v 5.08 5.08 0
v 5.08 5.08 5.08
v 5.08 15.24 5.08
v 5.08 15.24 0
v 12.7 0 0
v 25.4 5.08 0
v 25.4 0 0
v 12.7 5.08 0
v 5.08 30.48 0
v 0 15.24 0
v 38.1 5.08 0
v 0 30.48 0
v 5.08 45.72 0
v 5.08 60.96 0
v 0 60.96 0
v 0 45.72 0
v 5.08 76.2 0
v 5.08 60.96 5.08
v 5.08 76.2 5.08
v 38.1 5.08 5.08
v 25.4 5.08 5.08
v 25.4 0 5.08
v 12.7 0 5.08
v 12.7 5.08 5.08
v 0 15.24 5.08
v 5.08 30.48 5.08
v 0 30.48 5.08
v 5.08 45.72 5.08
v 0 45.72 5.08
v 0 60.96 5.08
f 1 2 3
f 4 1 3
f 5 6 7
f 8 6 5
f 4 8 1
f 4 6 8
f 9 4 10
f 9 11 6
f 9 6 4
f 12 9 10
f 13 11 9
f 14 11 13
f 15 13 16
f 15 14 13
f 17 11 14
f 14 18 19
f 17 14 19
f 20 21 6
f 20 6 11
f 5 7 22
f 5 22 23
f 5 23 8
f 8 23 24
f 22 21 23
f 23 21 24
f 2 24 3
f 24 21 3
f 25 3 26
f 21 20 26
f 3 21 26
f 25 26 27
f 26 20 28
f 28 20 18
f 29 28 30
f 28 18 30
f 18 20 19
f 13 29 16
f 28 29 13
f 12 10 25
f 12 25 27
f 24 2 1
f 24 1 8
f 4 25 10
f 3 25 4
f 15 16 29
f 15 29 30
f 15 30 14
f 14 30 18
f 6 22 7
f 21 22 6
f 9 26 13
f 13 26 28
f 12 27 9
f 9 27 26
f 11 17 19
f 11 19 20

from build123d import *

# Parameters (mm, degrees)
BOSS_EXTRUDE1_DEPTH = 5.08
SKETCH2_W           = 5.08
SKETCH2_H           = 15.24
SKETCH2_H_2         = 10.16
SKETCH2_H_3         = 5.08
SKETCH2_W_2         = 7.62
SKETCH2_W_3         = 12.7
CUT_EXTRUDE1_DEPTH  = 5.08


with BuildPart() as part:
    # Sketch1 → Boss-Extrude1 (new body)
    with BuildSketch(Plane.XY):
        Polygon((0, 0), (0, 76.2), (5.08, 76.2), (38.1, 5.08), (38.1, 0), align=None)
    extrude(amount=BOSS_EXTRUDE1_DEPTH)

    # Sketch2 → Cut-Extrude1 (cut)
    with BuildSketch(Plane.XY.offset(5.08)):
        with Locations((2.54, 68.58)):
            Rectangle(SKETCH2_W, SKETCH2_H)
        with Locations((2.54, 38.1)):
            Rectangle(SKETCH2_W, SKETCH2_H)
        with Locations((2.54, 10.16)):
            Rectangle(SKETCH2_W, SKETCH2_H_2)
        with Locations((2.54, 2.54)):
            Rectangle(SKETCH2_W, SKETCH2_H_3)
        with Locations((8.89, 2.54)):
            Rectangle(SKETCH2_W_2, SKETCH2_H_3)
        with Locations((31.75, 2.54)):
            Rectangle(SKETCH2_W_3, SKETCH2_H_3)
    extrude(amount=-CUT_EXTRUDE1_DEPTH, mode=Mode.SUBTRACT)


solid = part.part
